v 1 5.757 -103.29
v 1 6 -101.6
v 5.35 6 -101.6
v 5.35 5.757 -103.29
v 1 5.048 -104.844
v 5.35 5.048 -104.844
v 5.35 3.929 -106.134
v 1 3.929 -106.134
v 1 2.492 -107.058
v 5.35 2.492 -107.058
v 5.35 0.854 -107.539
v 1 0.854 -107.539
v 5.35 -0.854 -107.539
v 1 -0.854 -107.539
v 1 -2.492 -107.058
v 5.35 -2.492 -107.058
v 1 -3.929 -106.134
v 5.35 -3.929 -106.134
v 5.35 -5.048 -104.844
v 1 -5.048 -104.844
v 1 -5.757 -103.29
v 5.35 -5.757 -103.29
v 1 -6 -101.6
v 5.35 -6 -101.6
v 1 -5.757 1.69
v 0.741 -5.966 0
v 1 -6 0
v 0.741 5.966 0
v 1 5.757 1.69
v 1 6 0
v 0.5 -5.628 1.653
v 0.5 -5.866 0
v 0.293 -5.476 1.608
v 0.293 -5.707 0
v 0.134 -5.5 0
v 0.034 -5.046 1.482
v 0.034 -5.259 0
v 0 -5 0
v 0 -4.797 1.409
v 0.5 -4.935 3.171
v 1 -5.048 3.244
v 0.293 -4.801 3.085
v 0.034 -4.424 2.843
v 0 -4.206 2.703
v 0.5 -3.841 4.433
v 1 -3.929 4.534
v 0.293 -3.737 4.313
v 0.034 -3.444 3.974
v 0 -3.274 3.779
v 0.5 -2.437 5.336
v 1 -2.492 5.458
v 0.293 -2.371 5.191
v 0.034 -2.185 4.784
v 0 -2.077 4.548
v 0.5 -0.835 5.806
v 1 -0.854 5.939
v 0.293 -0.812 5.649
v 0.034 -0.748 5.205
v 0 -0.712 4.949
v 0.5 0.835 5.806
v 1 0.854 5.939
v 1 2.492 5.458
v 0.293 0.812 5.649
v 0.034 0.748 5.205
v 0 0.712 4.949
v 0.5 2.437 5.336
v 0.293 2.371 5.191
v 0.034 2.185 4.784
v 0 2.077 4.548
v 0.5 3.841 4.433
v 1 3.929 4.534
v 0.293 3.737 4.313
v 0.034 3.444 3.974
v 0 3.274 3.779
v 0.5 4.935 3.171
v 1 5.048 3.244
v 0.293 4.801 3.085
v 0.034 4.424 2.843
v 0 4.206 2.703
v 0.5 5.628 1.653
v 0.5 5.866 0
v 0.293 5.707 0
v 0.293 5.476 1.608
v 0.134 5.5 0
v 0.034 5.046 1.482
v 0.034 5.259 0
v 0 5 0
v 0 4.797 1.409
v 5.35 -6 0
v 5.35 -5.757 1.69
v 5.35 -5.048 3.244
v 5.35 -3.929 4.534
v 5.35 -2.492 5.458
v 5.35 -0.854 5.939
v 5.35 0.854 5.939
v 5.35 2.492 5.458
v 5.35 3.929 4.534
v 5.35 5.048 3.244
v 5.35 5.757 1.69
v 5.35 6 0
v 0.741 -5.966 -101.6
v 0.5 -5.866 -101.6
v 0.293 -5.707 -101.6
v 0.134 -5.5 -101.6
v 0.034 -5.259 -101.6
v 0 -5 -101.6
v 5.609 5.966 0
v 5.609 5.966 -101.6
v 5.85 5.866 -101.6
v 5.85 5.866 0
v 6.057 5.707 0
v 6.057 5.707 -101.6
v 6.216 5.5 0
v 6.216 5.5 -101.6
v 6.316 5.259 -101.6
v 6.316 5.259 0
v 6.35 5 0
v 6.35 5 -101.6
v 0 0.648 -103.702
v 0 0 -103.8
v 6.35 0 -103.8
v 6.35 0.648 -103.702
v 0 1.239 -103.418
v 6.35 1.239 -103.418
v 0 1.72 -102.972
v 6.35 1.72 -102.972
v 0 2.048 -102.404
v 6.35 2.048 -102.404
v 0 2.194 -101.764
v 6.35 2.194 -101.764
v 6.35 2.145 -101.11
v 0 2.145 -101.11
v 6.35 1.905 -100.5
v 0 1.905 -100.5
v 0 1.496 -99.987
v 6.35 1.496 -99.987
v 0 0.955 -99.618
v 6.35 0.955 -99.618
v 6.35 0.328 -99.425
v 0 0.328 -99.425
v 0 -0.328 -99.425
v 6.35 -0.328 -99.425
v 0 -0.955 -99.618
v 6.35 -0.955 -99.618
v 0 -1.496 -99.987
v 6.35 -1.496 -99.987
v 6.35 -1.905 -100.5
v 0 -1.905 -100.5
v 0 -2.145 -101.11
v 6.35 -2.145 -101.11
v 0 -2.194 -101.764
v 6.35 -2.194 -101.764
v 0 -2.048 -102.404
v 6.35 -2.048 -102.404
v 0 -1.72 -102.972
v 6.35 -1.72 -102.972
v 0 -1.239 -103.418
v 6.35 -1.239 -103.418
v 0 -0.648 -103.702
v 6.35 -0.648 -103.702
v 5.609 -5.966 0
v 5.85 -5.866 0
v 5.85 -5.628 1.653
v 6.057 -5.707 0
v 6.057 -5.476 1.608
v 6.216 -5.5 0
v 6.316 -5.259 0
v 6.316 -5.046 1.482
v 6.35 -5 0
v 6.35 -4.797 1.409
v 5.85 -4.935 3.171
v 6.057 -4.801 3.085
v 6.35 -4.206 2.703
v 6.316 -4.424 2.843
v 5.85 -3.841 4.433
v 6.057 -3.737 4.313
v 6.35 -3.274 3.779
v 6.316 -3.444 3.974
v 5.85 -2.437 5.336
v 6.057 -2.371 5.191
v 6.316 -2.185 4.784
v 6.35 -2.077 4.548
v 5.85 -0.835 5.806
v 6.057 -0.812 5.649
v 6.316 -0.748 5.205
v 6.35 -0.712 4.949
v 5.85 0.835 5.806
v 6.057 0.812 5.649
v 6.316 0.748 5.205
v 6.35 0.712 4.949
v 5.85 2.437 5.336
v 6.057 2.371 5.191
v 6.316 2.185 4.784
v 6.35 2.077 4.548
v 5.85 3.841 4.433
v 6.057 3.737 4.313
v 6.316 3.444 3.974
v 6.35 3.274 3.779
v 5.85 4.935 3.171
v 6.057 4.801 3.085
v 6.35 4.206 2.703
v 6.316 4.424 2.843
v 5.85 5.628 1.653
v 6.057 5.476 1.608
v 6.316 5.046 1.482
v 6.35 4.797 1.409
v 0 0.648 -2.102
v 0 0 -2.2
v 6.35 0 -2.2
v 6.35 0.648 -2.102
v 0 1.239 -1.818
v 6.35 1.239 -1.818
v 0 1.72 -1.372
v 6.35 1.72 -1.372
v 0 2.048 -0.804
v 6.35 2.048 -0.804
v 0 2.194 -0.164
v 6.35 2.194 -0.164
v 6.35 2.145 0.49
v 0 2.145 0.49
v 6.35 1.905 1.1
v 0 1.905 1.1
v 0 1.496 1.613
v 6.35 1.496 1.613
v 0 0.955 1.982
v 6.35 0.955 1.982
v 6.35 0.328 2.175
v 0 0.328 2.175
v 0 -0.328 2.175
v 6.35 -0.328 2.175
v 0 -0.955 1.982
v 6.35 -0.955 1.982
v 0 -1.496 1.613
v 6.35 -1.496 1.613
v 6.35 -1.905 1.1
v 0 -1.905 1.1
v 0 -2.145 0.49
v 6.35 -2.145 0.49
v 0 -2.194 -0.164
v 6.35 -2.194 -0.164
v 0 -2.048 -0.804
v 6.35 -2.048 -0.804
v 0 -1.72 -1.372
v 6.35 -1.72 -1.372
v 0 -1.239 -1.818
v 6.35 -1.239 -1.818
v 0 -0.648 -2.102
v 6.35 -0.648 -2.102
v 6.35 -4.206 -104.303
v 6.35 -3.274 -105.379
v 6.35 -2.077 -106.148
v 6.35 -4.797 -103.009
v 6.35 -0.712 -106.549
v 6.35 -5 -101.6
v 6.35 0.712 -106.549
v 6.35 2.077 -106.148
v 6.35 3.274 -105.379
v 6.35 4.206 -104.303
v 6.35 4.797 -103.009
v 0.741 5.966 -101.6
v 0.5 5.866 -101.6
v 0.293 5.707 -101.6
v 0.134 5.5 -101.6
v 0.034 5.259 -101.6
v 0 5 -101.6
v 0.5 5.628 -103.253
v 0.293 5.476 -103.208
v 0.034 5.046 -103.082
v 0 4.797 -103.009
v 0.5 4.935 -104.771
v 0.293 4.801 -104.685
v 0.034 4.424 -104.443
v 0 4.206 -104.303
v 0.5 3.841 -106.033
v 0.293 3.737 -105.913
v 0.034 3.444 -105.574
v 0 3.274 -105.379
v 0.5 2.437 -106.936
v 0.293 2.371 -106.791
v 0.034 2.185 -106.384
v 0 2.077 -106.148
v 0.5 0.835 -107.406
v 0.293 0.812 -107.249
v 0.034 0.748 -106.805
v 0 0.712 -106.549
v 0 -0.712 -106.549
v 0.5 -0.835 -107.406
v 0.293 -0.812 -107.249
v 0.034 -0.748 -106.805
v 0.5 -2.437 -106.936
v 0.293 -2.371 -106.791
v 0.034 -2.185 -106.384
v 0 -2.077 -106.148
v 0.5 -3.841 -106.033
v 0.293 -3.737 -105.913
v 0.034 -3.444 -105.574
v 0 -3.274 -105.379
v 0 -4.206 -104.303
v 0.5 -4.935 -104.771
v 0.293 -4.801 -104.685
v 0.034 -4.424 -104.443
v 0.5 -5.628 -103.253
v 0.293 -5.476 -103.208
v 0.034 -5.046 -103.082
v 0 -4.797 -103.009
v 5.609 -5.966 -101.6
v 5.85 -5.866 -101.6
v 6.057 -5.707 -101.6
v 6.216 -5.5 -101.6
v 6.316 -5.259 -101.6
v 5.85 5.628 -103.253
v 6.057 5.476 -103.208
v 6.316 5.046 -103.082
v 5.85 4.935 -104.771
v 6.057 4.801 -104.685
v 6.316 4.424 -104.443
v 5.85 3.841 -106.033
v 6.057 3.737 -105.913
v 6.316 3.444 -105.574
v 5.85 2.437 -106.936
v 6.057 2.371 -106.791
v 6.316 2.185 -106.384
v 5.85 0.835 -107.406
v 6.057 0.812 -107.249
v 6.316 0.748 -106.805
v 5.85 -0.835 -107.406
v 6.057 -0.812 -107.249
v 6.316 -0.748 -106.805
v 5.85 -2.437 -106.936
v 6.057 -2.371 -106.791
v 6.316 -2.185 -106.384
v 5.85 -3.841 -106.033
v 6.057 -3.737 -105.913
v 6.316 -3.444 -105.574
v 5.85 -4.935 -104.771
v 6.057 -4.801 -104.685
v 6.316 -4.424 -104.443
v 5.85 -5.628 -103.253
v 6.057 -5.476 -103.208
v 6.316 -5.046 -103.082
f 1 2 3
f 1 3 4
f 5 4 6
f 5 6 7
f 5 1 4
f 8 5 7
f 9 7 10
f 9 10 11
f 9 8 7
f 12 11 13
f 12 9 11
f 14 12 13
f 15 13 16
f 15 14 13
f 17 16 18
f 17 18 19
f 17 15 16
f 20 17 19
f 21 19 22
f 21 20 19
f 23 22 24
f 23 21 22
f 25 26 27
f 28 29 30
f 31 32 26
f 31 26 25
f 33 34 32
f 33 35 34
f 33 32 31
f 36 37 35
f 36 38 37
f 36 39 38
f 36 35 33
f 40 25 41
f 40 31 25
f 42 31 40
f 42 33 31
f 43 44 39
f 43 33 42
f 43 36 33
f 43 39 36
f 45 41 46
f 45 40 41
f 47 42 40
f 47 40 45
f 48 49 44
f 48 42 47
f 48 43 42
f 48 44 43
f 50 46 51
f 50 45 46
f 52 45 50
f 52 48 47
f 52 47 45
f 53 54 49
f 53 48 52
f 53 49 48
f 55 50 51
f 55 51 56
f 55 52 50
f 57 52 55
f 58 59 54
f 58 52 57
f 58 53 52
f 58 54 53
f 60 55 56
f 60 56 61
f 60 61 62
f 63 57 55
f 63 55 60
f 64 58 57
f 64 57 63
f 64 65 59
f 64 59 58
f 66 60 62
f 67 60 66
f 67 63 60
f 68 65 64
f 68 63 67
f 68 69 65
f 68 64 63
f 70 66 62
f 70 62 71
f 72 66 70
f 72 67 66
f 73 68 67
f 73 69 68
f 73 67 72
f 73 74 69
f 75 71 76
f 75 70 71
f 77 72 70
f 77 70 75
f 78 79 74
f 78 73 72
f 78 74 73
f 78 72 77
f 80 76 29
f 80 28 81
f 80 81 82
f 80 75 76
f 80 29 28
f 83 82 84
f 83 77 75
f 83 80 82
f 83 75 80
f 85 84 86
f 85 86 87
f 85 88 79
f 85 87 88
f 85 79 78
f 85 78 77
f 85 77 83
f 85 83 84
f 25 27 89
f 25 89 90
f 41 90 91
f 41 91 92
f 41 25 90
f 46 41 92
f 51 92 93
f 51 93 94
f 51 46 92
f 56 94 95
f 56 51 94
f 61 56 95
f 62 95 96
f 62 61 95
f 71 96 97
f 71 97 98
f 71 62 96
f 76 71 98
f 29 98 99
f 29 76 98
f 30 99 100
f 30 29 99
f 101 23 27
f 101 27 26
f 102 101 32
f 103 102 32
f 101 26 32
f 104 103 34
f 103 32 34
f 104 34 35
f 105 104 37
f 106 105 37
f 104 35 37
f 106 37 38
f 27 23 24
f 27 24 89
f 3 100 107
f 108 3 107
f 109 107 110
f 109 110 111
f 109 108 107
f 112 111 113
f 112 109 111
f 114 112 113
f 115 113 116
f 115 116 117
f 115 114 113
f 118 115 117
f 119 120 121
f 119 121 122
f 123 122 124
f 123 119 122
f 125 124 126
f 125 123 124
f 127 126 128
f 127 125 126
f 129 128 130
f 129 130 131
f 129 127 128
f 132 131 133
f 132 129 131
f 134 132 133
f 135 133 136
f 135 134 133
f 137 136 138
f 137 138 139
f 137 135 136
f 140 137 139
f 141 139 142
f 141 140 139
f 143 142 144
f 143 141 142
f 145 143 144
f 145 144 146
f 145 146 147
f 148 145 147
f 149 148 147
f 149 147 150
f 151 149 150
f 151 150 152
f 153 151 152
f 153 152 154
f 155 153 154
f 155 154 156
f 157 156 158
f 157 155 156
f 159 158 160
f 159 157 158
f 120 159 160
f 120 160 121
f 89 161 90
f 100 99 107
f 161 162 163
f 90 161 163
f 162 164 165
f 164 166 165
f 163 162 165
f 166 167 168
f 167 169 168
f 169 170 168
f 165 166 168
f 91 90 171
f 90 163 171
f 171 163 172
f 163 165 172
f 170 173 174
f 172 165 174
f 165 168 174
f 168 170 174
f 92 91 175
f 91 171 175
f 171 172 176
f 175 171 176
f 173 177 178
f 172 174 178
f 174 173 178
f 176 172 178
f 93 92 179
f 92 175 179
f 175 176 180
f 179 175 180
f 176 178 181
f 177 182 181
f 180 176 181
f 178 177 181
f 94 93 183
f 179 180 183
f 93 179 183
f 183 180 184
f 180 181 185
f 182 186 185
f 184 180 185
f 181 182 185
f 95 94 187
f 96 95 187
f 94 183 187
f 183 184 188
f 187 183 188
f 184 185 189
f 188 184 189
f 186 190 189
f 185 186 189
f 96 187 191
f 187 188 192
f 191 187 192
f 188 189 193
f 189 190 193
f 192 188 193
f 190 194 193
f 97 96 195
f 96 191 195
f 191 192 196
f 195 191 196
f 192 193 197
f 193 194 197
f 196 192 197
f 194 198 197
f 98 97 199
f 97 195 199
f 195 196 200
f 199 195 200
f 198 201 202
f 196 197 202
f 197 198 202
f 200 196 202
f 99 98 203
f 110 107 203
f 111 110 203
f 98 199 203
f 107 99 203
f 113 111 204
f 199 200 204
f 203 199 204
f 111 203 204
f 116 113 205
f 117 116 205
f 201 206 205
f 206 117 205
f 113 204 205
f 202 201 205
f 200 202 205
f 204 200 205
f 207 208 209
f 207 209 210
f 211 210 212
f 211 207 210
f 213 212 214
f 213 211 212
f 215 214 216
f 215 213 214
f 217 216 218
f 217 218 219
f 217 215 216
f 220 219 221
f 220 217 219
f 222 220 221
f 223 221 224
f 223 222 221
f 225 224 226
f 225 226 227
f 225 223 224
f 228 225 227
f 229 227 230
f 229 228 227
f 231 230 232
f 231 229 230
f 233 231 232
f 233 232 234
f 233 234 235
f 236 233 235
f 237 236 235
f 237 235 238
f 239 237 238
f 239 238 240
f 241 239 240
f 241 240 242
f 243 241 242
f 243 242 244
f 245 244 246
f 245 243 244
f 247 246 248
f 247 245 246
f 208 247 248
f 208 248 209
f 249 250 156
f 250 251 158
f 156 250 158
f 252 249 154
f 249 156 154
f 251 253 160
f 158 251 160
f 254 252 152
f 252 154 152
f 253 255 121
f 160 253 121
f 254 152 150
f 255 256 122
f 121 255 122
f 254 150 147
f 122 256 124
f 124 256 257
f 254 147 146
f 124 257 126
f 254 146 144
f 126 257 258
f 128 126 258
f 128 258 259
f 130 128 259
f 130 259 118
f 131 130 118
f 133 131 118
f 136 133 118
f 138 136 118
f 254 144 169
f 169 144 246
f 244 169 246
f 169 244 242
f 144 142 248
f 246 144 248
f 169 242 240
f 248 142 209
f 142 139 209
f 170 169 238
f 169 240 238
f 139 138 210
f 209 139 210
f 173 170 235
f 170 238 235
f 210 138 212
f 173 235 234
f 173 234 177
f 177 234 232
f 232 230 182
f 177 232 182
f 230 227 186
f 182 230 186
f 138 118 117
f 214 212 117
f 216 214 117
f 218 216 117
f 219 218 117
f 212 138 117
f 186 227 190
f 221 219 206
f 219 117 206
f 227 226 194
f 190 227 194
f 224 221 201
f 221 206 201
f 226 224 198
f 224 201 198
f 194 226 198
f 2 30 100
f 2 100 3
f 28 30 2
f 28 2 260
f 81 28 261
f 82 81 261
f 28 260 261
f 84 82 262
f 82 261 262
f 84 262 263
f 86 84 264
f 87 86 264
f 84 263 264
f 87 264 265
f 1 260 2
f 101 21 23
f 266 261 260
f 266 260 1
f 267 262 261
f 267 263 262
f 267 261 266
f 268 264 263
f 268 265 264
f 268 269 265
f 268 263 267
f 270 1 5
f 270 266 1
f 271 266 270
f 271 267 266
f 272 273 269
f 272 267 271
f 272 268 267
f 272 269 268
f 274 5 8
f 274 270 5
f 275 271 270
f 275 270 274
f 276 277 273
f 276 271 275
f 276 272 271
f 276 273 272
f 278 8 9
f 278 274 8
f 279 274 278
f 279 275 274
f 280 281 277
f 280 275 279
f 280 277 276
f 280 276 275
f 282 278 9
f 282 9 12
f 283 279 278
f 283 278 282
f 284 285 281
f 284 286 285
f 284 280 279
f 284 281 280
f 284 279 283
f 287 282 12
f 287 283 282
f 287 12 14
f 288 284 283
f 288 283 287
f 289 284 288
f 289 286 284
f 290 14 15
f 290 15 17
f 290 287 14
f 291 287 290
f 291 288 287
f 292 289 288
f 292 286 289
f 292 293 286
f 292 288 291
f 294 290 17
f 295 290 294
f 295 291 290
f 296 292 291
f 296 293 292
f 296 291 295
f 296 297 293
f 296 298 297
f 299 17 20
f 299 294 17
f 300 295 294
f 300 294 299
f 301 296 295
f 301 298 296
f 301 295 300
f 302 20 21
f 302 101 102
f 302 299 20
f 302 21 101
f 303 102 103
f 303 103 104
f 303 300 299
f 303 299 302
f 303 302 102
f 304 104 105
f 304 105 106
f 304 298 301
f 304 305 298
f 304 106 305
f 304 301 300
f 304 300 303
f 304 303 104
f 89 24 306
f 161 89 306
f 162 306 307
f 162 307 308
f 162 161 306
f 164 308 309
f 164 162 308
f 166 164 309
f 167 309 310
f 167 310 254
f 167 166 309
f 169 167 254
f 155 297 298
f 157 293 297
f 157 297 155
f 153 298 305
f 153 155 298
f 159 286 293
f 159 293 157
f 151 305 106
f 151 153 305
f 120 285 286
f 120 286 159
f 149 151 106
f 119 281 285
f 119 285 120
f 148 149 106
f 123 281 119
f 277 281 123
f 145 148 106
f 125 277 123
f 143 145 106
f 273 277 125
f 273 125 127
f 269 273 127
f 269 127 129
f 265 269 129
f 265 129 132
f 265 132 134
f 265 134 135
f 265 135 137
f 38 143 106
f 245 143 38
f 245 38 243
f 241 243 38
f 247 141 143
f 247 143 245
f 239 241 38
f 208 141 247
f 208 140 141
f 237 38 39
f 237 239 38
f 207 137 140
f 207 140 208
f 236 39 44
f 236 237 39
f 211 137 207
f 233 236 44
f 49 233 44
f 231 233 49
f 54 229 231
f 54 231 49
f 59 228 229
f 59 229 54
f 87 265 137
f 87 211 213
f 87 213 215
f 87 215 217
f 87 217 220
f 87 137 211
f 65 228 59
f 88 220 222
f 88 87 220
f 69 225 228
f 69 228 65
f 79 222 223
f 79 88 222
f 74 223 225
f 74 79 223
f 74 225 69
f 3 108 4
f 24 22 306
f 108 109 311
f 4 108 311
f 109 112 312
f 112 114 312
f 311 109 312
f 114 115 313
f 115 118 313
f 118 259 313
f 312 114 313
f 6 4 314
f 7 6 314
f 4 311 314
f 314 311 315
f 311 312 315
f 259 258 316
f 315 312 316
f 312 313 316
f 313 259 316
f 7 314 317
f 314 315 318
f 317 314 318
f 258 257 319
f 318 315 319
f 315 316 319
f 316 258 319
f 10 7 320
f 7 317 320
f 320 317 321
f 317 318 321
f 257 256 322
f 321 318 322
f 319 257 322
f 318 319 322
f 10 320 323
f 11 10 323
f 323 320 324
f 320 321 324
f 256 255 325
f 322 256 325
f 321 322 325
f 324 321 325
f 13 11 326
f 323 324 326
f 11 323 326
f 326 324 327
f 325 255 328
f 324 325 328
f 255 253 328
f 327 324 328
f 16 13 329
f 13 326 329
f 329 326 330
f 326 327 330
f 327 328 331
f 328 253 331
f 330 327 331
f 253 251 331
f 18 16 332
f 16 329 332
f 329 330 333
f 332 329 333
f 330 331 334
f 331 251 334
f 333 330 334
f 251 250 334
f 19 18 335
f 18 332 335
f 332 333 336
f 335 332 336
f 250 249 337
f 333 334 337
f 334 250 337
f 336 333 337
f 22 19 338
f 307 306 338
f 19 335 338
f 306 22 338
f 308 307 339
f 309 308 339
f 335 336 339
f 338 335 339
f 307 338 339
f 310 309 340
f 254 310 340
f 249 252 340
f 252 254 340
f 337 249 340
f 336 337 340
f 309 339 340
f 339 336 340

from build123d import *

# Parameters (mm, degrees)
SKETCH1_R           = 2.2
BOSS_EXTRUDE1_DEPTH = 6.35
FILLET1_R           = 1


with BuildPart() as part:
    # Sketch1 → Boss-Extrude1 (new body)
    with BuildSketch(Plane(origin=(0, 0, 0), x_dir=(0, 0, -1), z_dir=(1, 0, 0))):
        with BuildLine():
            Line((0, 6), (101.6, 6))
            ThreePointArc((101.6, 6), (107.6, 0), (101.6, -6))
            Line((101.6, -6), (0, -6))
            ThreePointArc((0, -6), (-6, 0), (0, 6))
        make_face()
        Circle(SKETCH1_R, mode=Mode.SUBTRACT)
        with Locations((101.6, 0)):
            Circle(SKETCH1_R, mode=Mode.SUBTRACT)
    extrude(amount=BOSS_EXTRUDE1_DEPTH)

    # Fillet1
    fillet1_edges = [part.edges().sort_by_distance(p)[0] for p in [
        (6.35, 0, -107.6),
        (6.35, 6, -50.8),
        (6.35, 0, 6),
        (0, 6, -50.8),
        (0, 0, -107.6),
        (0, -6, -50.8),
        (0, 0, 6),
        (6.35, -6, -50.8),
    ]]
    fillet(fillet1_edges, radius=FILLET1_R)


solid = part.part
